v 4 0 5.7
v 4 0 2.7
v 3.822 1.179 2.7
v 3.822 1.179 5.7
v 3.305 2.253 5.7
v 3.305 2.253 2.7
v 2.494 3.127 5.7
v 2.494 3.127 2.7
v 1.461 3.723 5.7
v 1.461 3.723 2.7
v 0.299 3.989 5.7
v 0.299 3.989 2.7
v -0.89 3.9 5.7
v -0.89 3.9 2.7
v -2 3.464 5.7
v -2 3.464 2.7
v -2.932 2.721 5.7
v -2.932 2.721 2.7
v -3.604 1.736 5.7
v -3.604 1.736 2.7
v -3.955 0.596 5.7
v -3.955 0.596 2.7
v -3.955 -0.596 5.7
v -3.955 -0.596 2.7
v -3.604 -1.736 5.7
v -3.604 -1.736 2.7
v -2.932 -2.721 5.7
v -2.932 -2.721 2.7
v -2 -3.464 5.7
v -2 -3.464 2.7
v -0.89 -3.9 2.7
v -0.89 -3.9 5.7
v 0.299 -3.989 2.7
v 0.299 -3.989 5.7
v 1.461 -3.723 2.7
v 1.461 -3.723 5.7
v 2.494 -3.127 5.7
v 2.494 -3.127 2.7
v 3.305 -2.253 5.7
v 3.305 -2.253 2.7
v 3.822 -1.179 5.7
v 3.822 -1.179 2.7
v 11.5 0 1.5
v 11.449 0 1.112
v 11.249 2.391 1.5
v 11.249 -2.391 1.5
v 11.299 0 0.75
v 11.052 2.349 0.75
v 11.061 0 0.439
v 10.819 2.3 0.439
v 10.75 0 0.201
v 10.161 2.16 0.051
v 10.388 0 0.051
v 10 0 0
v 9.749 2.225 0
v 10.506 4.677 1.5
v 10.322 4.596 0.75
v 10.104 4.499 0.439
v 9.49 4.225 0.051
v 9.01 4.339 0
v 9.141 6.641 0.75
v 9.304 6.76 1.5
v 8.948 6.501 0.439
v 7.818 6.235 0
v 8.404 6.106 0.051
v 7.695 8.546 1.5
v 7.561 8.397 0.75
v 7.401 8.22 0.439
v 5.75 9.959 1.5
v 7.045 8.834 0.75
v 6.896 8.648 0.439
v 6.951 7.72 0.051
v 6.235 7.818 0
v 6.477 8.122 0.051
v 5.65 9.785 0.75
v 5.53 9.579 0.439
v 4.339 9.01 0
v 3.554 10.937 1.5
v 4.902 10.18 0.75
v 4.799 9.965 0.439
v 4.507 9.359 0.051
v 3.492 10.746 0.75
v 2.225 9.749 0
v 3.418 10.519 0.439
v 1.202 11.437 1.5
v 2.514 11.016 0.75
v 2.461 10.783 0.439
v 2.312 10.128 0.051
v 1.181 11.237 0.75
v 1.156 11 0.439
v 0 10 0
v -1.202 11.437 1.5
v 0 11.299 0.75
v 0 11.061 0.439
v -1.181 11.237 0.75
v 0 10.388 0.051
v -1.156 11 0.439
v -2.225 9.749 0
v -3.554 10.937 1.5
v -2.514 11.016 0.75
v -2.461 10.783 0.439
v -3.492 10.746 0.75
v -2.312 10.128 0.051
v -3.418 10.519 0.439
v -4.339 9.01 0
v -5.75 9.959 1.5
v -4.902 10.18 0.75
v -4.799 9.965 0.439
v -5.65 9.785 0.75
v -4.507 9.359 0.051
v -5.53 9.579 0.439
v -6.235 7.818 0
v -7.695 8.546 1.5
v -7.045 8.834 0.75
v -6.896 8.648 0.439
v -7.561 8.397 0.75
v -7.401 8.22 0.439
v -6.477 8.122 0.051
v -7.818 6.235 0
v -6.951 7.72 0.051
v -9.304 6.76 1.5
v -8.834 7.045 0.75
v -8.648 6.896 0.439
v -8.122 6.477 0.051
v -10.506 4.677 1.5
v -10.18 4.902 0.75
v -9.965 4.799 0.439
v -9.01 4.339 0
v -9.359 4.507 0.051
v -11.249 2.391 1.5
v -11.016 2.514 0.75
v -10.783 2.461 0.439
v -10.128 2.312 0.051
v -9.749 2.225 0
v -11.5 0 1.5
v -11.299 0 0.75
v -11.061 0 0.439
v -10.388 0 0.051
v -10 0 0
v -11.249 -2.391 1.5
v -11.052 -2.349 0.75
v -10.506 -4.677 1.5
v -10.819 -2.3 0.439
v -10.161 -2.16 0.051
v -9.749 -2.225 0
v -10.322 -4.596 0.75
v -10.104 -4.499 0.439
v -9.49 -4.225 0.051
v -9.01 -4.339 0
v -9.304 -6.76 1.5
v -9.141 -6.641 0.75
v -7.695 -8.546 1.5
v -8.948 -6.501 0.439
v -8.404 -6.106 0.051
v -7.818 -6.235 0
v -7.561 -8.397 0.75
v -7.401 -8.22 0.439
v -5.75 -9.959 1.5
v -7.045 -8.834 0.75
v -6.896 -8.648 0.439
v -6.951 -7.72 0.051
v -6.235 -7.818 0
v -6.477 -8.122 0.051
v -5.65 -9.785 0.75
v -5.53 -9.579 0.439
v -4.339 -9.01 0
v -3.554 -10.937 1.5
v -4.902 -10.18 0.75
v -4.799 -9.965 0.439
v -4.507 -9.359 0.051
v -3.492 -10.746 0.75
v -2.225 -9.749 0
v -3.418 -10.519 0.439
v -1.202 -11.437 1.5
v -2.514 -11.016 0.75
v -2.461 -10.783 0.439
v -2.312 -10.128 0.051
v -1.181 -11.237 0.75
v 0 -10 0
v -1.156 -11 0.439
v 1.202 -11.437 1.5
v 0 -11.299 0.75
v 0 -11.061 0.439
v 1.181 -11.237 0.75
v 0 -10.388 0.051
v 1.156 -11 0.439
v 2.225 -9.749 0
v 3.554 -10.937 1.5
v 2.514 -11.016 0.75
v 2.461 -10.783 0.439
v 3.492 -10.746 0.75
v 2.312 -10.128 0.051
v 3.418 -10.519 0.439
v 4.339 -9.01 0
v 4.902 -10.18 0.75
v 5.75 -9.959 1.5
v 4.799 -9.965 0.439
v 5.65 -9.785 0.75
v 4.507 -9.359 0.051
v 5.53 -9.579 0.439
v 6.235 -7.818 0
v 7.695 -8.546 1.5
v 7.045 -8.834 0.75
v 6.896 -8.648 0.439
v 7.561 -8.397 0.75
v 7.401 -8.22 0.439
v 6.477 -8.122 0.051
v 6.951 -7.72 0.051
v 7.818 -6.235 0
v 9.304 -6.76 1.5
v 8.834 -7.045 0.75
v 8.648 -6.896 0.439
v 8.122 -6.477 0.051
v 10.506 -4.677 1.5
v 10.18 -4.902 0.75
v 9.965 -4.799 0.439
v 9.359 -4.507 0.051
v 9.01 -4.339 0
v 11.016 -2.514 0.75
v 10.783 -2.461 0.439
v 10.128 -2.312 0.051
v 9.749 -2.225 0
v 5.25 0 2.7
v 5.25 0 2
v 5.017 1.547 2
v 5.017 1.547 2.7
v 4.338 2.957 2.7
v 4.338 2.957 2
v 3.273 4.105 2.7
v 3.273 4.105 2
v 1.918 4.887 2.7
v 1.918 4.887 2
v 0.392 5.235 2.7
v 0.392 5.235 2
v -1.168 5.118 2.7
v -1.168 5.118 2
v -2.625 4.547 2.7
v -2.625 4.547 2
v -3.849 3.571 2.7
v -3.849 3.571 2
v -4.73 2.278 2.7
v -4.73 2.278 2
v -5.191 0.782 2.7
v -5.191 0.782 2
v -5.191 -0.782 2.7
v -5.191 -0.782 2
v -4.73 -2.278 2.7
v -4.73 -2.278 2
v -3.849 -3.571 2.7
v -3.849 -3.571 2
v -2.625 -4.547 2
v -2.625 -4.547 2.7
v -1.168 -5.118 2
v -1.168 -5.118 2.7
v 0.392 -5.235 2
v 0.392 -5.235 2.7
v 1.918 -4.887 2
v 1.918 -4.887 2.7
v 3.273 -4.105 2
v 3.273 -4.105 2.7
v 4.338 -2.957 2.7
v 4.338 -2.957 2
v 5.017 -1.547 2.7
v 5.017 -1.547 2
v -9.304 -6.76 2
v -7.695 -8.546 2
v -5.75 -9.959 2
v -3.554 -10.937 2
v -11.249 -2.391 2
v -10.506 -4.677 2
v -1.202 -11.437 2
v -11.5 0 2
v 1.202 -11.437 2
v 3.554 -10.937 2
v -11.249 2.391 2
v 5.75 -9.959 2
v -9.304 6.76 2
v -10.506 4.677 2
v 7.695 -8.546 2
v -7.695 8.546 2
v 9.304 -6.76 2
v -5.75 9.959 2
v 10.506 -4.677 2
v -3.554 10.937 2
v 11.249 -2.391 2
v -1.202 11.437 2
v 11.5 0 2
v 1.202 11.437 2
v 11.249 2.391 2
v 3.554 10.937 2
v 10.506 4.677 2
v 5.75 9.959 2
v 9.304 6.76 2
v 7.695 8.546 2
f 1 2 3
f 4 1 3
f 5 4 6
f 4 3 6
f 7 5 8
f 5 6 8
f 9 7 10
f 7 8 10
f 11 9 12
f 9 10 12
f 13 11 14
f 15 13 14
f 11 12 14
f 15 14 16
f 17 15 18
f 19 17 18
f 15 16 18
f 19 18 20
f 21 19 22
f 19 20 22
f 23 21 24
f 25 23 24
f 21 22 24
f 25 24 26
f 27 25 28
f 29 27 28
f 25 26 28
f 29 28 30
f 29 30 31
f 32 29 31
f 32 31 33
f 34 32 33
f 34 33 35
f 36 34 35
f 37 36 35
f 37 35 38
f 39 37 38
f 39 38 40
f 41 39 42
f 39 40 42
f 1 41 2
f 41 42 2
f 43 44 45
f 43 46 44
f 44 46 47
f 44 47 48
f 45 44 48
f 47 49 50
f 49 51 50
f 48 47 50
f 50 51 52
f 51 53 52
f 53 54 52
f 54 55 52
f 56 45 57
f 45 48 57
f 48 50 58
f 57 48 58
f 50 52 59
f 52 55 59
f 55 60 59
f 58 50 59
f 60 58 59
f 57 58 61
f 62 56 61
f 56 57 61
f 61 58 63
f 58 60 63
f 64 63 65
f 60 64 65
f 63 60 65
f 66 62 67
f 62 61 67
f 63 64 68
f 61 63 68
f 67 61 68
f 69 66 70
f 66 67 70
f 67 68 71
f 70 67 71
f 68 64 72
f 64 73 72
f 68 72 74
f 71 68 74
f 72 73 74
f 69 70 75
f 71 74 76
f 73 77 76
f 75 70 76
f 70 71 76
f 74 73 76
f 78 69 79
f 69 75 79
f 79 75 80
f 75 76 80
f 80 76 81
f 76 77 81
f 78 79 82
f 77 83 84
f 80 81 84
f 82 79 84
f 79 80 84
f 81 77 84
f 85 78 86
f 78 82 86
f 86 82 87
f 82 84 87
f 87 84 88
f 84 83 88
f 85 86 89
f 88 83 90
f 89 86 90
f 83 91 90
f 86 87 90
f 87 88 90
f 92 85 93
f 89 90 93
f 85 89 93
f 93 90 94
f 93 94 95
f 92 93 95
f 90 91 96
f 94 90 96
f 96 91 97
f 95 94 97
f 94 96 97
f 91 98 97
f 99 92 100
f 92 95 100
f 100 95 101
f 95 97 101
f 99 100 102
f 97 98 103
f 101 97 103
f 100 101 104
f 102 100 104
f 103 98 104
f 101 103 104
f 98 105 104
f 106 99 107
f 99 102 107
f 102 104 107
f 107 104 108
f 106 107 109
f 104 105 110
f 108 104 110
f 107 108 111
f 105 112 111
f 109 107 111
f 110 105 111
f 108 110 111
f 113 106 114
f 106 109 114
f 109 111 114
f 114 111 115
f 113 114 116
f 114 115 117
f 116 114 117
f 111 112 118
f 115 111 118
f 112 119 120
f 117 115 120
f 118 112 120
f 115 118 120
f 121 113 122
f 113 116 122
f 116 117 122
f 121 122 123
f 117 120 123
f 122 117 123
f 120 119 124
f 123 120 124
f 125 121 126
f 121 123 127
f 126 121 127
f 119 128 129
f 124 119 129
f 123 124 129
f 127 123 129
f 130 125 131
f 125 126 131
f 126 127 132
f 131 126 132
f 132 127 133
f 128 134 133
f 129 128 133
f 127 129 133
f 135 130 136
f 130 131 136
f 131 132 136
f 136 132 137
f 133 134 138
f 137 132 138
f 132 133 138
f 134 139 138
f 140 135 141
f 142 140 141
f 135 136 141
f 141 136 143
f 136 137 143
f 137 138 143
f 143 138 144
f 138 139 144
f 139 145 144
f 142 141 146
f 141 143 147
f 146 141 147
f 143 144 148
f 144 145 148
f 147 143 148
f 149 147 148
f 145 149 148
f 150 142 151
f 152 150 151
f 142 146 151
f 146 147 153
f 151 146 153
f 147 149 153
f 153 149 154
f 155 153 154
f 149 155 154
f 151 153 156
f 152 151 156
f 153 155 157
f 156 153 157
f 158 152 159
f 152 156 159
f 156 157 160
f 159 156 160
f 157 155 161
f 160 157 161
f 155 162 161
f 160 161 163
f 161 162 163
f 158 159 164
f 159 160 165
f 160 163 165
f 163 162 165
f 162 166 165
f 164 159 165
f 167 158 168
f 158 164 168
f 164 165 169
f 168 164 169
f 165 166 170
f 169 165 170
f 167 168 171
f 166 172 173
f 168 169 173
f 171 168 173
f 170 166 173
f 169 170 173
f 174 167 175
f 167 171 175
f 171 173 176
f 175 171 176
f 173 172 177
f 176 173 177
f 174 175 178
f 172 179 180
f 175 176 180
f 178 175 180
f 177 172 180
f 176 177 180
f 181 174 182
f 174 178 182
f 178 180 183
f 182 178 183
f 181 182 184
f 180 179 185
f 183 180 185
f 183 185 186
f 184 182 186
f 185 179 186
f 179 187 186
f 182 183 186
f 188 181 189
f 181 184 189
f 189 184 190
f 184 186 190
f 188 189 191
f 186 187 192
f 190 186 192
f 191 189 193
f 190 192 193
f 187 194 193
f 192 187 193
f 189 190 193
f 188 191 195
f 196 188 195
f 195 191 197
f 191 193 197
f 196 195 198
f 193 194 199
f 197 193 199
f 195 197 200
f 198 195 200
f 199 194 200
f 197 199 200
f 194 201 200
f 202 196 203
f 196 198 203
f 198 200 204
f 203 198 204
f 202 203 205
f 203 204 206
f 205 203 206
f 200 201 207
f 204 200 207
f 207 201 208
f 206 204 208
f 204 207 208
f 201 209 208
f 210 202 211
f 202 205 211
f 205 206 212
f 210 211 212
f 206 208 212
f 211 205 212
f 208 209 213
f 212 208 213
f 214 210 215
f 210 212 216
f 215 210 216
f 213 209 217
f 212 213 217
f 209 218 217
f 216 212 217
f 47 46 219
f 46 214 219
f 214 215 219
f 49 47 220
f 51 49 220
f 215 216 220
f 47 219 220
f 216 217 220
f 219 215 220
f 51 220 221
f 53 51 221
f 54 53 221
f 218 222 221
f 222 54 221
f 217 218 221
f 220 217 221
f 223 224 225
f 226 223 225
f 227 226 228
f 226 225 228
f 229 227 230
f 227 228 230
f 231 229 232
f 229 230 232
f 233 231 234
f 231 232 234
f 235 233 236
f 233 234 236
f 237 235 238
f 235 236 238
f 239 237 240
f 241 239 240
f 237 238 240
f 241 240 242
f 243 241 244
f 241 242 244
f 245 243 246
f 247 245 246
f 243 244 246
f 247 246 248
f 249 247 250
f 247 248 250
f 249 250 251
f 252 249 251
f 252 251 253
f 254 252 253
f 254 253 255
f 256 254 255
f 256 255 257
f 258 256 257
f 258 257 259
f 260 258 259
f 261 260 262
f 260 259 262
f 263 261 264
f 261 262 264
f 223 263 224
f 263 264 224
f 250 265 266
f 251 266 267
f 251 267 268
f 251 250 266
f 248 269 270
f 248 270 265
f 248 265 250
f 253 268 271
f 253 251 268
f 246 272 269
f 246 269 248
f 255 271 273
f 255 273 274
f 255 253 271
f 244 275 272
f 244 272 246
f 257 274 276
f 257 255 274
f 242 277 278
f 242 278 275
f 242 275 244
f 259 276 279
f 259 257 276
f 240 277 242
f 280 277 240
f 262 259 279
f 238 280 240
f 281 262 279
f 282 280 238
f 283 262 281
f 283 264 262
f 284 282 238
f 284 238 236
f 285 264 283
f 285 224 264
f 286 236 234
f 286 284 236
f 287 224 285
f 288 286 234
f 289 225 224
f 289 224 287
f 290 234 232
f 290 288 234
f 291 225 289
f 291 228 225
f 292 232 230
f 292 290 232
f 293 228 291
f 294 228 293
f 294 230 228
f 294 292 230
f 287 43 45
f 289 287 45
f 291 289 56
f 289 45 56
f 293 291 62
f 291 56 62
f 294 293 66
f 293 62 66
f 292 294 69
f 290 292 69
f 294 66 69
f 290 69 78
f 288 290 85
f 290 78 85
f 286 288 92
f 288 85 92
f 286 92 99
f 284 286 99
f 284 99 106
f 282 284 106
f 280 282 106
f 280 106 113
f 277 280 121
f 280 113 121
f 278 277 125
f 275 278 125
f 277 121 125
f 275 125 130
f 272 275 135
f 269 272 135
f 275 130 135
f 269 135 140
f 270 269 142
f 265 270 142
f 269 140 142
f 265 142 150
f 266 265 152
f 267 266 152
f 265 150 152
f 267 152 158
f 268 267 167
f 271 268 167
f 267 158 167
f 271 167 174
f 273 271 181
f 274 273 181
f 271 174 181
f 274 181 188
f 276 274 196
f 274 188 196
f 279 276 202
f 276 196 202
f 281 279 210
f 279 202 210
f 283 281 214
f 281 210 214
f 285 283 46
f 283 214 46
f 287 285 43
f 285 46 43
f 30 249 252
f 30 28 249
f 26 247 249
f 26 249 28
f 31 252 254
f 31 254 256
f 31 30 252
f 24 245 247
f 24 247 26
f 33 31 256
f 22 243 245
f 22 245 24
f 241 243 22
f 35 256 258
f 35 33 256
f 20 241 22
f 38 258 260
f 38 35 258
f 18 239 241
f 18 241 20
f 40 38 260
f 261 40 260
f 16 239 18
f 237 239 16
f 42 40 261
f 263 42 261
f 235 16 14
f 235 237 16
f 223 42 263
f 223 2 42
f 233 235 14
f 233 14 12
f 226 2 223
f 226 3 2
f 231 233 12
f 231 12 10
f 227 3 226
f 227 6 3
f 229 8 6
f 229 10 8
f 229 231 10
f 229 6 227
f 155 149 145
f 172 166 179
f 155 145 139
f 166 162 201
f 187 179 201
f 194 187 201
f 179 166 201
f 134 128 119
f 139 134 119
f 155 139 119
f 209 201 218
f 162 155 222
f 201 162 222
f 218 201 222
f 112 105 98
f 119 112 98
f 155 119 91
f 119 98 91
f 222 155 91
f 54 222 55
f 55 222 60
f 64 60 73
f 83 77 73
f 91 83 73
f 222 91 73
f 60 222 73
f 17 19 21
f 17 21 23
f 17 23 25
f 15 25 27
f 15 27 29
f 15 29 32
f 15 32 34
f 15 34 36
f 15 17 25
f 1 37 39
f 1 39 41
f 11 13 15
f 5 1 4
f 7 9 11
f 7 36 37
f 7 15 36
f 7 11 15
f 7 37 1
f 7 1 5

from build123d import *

# Parameters (mm, degrees)
F0_R     = 11.5
F1_DEPTH = 2
F2_R     = 5.25
F3_DEPTH = 0.7
F4_R     = 4
F5_DEPTH = 3
F6_R     = 1.5


with BuildPart() as f1:
    # F0 (on Top) → F1 (new body)
    with BuildSketch(Plane.XY):
        Circle(F0_R)
    extrude(amount=F1_DEPTH)

    # F2 (on face) → F3 (join)
    with BuildSketch(Plane.XY.offset(2)):
        Circle(F2_R)
    extrude(amount=F3_DEPTH)

    # F4 (on face) → F5 (join)
    with BuildSketch(Plane.XY.offset(2.7)):
        Circle(F4_R)
    extrude(amount=F5_DEPTH)

    # F6
    f6_edges = [f1.edges().sort_by_distance(p)[0] for p in [
        (-11.5, 0, 0),
    ]]
    fillet(f6_edges, radius=F6_R)


solid = f1.part
